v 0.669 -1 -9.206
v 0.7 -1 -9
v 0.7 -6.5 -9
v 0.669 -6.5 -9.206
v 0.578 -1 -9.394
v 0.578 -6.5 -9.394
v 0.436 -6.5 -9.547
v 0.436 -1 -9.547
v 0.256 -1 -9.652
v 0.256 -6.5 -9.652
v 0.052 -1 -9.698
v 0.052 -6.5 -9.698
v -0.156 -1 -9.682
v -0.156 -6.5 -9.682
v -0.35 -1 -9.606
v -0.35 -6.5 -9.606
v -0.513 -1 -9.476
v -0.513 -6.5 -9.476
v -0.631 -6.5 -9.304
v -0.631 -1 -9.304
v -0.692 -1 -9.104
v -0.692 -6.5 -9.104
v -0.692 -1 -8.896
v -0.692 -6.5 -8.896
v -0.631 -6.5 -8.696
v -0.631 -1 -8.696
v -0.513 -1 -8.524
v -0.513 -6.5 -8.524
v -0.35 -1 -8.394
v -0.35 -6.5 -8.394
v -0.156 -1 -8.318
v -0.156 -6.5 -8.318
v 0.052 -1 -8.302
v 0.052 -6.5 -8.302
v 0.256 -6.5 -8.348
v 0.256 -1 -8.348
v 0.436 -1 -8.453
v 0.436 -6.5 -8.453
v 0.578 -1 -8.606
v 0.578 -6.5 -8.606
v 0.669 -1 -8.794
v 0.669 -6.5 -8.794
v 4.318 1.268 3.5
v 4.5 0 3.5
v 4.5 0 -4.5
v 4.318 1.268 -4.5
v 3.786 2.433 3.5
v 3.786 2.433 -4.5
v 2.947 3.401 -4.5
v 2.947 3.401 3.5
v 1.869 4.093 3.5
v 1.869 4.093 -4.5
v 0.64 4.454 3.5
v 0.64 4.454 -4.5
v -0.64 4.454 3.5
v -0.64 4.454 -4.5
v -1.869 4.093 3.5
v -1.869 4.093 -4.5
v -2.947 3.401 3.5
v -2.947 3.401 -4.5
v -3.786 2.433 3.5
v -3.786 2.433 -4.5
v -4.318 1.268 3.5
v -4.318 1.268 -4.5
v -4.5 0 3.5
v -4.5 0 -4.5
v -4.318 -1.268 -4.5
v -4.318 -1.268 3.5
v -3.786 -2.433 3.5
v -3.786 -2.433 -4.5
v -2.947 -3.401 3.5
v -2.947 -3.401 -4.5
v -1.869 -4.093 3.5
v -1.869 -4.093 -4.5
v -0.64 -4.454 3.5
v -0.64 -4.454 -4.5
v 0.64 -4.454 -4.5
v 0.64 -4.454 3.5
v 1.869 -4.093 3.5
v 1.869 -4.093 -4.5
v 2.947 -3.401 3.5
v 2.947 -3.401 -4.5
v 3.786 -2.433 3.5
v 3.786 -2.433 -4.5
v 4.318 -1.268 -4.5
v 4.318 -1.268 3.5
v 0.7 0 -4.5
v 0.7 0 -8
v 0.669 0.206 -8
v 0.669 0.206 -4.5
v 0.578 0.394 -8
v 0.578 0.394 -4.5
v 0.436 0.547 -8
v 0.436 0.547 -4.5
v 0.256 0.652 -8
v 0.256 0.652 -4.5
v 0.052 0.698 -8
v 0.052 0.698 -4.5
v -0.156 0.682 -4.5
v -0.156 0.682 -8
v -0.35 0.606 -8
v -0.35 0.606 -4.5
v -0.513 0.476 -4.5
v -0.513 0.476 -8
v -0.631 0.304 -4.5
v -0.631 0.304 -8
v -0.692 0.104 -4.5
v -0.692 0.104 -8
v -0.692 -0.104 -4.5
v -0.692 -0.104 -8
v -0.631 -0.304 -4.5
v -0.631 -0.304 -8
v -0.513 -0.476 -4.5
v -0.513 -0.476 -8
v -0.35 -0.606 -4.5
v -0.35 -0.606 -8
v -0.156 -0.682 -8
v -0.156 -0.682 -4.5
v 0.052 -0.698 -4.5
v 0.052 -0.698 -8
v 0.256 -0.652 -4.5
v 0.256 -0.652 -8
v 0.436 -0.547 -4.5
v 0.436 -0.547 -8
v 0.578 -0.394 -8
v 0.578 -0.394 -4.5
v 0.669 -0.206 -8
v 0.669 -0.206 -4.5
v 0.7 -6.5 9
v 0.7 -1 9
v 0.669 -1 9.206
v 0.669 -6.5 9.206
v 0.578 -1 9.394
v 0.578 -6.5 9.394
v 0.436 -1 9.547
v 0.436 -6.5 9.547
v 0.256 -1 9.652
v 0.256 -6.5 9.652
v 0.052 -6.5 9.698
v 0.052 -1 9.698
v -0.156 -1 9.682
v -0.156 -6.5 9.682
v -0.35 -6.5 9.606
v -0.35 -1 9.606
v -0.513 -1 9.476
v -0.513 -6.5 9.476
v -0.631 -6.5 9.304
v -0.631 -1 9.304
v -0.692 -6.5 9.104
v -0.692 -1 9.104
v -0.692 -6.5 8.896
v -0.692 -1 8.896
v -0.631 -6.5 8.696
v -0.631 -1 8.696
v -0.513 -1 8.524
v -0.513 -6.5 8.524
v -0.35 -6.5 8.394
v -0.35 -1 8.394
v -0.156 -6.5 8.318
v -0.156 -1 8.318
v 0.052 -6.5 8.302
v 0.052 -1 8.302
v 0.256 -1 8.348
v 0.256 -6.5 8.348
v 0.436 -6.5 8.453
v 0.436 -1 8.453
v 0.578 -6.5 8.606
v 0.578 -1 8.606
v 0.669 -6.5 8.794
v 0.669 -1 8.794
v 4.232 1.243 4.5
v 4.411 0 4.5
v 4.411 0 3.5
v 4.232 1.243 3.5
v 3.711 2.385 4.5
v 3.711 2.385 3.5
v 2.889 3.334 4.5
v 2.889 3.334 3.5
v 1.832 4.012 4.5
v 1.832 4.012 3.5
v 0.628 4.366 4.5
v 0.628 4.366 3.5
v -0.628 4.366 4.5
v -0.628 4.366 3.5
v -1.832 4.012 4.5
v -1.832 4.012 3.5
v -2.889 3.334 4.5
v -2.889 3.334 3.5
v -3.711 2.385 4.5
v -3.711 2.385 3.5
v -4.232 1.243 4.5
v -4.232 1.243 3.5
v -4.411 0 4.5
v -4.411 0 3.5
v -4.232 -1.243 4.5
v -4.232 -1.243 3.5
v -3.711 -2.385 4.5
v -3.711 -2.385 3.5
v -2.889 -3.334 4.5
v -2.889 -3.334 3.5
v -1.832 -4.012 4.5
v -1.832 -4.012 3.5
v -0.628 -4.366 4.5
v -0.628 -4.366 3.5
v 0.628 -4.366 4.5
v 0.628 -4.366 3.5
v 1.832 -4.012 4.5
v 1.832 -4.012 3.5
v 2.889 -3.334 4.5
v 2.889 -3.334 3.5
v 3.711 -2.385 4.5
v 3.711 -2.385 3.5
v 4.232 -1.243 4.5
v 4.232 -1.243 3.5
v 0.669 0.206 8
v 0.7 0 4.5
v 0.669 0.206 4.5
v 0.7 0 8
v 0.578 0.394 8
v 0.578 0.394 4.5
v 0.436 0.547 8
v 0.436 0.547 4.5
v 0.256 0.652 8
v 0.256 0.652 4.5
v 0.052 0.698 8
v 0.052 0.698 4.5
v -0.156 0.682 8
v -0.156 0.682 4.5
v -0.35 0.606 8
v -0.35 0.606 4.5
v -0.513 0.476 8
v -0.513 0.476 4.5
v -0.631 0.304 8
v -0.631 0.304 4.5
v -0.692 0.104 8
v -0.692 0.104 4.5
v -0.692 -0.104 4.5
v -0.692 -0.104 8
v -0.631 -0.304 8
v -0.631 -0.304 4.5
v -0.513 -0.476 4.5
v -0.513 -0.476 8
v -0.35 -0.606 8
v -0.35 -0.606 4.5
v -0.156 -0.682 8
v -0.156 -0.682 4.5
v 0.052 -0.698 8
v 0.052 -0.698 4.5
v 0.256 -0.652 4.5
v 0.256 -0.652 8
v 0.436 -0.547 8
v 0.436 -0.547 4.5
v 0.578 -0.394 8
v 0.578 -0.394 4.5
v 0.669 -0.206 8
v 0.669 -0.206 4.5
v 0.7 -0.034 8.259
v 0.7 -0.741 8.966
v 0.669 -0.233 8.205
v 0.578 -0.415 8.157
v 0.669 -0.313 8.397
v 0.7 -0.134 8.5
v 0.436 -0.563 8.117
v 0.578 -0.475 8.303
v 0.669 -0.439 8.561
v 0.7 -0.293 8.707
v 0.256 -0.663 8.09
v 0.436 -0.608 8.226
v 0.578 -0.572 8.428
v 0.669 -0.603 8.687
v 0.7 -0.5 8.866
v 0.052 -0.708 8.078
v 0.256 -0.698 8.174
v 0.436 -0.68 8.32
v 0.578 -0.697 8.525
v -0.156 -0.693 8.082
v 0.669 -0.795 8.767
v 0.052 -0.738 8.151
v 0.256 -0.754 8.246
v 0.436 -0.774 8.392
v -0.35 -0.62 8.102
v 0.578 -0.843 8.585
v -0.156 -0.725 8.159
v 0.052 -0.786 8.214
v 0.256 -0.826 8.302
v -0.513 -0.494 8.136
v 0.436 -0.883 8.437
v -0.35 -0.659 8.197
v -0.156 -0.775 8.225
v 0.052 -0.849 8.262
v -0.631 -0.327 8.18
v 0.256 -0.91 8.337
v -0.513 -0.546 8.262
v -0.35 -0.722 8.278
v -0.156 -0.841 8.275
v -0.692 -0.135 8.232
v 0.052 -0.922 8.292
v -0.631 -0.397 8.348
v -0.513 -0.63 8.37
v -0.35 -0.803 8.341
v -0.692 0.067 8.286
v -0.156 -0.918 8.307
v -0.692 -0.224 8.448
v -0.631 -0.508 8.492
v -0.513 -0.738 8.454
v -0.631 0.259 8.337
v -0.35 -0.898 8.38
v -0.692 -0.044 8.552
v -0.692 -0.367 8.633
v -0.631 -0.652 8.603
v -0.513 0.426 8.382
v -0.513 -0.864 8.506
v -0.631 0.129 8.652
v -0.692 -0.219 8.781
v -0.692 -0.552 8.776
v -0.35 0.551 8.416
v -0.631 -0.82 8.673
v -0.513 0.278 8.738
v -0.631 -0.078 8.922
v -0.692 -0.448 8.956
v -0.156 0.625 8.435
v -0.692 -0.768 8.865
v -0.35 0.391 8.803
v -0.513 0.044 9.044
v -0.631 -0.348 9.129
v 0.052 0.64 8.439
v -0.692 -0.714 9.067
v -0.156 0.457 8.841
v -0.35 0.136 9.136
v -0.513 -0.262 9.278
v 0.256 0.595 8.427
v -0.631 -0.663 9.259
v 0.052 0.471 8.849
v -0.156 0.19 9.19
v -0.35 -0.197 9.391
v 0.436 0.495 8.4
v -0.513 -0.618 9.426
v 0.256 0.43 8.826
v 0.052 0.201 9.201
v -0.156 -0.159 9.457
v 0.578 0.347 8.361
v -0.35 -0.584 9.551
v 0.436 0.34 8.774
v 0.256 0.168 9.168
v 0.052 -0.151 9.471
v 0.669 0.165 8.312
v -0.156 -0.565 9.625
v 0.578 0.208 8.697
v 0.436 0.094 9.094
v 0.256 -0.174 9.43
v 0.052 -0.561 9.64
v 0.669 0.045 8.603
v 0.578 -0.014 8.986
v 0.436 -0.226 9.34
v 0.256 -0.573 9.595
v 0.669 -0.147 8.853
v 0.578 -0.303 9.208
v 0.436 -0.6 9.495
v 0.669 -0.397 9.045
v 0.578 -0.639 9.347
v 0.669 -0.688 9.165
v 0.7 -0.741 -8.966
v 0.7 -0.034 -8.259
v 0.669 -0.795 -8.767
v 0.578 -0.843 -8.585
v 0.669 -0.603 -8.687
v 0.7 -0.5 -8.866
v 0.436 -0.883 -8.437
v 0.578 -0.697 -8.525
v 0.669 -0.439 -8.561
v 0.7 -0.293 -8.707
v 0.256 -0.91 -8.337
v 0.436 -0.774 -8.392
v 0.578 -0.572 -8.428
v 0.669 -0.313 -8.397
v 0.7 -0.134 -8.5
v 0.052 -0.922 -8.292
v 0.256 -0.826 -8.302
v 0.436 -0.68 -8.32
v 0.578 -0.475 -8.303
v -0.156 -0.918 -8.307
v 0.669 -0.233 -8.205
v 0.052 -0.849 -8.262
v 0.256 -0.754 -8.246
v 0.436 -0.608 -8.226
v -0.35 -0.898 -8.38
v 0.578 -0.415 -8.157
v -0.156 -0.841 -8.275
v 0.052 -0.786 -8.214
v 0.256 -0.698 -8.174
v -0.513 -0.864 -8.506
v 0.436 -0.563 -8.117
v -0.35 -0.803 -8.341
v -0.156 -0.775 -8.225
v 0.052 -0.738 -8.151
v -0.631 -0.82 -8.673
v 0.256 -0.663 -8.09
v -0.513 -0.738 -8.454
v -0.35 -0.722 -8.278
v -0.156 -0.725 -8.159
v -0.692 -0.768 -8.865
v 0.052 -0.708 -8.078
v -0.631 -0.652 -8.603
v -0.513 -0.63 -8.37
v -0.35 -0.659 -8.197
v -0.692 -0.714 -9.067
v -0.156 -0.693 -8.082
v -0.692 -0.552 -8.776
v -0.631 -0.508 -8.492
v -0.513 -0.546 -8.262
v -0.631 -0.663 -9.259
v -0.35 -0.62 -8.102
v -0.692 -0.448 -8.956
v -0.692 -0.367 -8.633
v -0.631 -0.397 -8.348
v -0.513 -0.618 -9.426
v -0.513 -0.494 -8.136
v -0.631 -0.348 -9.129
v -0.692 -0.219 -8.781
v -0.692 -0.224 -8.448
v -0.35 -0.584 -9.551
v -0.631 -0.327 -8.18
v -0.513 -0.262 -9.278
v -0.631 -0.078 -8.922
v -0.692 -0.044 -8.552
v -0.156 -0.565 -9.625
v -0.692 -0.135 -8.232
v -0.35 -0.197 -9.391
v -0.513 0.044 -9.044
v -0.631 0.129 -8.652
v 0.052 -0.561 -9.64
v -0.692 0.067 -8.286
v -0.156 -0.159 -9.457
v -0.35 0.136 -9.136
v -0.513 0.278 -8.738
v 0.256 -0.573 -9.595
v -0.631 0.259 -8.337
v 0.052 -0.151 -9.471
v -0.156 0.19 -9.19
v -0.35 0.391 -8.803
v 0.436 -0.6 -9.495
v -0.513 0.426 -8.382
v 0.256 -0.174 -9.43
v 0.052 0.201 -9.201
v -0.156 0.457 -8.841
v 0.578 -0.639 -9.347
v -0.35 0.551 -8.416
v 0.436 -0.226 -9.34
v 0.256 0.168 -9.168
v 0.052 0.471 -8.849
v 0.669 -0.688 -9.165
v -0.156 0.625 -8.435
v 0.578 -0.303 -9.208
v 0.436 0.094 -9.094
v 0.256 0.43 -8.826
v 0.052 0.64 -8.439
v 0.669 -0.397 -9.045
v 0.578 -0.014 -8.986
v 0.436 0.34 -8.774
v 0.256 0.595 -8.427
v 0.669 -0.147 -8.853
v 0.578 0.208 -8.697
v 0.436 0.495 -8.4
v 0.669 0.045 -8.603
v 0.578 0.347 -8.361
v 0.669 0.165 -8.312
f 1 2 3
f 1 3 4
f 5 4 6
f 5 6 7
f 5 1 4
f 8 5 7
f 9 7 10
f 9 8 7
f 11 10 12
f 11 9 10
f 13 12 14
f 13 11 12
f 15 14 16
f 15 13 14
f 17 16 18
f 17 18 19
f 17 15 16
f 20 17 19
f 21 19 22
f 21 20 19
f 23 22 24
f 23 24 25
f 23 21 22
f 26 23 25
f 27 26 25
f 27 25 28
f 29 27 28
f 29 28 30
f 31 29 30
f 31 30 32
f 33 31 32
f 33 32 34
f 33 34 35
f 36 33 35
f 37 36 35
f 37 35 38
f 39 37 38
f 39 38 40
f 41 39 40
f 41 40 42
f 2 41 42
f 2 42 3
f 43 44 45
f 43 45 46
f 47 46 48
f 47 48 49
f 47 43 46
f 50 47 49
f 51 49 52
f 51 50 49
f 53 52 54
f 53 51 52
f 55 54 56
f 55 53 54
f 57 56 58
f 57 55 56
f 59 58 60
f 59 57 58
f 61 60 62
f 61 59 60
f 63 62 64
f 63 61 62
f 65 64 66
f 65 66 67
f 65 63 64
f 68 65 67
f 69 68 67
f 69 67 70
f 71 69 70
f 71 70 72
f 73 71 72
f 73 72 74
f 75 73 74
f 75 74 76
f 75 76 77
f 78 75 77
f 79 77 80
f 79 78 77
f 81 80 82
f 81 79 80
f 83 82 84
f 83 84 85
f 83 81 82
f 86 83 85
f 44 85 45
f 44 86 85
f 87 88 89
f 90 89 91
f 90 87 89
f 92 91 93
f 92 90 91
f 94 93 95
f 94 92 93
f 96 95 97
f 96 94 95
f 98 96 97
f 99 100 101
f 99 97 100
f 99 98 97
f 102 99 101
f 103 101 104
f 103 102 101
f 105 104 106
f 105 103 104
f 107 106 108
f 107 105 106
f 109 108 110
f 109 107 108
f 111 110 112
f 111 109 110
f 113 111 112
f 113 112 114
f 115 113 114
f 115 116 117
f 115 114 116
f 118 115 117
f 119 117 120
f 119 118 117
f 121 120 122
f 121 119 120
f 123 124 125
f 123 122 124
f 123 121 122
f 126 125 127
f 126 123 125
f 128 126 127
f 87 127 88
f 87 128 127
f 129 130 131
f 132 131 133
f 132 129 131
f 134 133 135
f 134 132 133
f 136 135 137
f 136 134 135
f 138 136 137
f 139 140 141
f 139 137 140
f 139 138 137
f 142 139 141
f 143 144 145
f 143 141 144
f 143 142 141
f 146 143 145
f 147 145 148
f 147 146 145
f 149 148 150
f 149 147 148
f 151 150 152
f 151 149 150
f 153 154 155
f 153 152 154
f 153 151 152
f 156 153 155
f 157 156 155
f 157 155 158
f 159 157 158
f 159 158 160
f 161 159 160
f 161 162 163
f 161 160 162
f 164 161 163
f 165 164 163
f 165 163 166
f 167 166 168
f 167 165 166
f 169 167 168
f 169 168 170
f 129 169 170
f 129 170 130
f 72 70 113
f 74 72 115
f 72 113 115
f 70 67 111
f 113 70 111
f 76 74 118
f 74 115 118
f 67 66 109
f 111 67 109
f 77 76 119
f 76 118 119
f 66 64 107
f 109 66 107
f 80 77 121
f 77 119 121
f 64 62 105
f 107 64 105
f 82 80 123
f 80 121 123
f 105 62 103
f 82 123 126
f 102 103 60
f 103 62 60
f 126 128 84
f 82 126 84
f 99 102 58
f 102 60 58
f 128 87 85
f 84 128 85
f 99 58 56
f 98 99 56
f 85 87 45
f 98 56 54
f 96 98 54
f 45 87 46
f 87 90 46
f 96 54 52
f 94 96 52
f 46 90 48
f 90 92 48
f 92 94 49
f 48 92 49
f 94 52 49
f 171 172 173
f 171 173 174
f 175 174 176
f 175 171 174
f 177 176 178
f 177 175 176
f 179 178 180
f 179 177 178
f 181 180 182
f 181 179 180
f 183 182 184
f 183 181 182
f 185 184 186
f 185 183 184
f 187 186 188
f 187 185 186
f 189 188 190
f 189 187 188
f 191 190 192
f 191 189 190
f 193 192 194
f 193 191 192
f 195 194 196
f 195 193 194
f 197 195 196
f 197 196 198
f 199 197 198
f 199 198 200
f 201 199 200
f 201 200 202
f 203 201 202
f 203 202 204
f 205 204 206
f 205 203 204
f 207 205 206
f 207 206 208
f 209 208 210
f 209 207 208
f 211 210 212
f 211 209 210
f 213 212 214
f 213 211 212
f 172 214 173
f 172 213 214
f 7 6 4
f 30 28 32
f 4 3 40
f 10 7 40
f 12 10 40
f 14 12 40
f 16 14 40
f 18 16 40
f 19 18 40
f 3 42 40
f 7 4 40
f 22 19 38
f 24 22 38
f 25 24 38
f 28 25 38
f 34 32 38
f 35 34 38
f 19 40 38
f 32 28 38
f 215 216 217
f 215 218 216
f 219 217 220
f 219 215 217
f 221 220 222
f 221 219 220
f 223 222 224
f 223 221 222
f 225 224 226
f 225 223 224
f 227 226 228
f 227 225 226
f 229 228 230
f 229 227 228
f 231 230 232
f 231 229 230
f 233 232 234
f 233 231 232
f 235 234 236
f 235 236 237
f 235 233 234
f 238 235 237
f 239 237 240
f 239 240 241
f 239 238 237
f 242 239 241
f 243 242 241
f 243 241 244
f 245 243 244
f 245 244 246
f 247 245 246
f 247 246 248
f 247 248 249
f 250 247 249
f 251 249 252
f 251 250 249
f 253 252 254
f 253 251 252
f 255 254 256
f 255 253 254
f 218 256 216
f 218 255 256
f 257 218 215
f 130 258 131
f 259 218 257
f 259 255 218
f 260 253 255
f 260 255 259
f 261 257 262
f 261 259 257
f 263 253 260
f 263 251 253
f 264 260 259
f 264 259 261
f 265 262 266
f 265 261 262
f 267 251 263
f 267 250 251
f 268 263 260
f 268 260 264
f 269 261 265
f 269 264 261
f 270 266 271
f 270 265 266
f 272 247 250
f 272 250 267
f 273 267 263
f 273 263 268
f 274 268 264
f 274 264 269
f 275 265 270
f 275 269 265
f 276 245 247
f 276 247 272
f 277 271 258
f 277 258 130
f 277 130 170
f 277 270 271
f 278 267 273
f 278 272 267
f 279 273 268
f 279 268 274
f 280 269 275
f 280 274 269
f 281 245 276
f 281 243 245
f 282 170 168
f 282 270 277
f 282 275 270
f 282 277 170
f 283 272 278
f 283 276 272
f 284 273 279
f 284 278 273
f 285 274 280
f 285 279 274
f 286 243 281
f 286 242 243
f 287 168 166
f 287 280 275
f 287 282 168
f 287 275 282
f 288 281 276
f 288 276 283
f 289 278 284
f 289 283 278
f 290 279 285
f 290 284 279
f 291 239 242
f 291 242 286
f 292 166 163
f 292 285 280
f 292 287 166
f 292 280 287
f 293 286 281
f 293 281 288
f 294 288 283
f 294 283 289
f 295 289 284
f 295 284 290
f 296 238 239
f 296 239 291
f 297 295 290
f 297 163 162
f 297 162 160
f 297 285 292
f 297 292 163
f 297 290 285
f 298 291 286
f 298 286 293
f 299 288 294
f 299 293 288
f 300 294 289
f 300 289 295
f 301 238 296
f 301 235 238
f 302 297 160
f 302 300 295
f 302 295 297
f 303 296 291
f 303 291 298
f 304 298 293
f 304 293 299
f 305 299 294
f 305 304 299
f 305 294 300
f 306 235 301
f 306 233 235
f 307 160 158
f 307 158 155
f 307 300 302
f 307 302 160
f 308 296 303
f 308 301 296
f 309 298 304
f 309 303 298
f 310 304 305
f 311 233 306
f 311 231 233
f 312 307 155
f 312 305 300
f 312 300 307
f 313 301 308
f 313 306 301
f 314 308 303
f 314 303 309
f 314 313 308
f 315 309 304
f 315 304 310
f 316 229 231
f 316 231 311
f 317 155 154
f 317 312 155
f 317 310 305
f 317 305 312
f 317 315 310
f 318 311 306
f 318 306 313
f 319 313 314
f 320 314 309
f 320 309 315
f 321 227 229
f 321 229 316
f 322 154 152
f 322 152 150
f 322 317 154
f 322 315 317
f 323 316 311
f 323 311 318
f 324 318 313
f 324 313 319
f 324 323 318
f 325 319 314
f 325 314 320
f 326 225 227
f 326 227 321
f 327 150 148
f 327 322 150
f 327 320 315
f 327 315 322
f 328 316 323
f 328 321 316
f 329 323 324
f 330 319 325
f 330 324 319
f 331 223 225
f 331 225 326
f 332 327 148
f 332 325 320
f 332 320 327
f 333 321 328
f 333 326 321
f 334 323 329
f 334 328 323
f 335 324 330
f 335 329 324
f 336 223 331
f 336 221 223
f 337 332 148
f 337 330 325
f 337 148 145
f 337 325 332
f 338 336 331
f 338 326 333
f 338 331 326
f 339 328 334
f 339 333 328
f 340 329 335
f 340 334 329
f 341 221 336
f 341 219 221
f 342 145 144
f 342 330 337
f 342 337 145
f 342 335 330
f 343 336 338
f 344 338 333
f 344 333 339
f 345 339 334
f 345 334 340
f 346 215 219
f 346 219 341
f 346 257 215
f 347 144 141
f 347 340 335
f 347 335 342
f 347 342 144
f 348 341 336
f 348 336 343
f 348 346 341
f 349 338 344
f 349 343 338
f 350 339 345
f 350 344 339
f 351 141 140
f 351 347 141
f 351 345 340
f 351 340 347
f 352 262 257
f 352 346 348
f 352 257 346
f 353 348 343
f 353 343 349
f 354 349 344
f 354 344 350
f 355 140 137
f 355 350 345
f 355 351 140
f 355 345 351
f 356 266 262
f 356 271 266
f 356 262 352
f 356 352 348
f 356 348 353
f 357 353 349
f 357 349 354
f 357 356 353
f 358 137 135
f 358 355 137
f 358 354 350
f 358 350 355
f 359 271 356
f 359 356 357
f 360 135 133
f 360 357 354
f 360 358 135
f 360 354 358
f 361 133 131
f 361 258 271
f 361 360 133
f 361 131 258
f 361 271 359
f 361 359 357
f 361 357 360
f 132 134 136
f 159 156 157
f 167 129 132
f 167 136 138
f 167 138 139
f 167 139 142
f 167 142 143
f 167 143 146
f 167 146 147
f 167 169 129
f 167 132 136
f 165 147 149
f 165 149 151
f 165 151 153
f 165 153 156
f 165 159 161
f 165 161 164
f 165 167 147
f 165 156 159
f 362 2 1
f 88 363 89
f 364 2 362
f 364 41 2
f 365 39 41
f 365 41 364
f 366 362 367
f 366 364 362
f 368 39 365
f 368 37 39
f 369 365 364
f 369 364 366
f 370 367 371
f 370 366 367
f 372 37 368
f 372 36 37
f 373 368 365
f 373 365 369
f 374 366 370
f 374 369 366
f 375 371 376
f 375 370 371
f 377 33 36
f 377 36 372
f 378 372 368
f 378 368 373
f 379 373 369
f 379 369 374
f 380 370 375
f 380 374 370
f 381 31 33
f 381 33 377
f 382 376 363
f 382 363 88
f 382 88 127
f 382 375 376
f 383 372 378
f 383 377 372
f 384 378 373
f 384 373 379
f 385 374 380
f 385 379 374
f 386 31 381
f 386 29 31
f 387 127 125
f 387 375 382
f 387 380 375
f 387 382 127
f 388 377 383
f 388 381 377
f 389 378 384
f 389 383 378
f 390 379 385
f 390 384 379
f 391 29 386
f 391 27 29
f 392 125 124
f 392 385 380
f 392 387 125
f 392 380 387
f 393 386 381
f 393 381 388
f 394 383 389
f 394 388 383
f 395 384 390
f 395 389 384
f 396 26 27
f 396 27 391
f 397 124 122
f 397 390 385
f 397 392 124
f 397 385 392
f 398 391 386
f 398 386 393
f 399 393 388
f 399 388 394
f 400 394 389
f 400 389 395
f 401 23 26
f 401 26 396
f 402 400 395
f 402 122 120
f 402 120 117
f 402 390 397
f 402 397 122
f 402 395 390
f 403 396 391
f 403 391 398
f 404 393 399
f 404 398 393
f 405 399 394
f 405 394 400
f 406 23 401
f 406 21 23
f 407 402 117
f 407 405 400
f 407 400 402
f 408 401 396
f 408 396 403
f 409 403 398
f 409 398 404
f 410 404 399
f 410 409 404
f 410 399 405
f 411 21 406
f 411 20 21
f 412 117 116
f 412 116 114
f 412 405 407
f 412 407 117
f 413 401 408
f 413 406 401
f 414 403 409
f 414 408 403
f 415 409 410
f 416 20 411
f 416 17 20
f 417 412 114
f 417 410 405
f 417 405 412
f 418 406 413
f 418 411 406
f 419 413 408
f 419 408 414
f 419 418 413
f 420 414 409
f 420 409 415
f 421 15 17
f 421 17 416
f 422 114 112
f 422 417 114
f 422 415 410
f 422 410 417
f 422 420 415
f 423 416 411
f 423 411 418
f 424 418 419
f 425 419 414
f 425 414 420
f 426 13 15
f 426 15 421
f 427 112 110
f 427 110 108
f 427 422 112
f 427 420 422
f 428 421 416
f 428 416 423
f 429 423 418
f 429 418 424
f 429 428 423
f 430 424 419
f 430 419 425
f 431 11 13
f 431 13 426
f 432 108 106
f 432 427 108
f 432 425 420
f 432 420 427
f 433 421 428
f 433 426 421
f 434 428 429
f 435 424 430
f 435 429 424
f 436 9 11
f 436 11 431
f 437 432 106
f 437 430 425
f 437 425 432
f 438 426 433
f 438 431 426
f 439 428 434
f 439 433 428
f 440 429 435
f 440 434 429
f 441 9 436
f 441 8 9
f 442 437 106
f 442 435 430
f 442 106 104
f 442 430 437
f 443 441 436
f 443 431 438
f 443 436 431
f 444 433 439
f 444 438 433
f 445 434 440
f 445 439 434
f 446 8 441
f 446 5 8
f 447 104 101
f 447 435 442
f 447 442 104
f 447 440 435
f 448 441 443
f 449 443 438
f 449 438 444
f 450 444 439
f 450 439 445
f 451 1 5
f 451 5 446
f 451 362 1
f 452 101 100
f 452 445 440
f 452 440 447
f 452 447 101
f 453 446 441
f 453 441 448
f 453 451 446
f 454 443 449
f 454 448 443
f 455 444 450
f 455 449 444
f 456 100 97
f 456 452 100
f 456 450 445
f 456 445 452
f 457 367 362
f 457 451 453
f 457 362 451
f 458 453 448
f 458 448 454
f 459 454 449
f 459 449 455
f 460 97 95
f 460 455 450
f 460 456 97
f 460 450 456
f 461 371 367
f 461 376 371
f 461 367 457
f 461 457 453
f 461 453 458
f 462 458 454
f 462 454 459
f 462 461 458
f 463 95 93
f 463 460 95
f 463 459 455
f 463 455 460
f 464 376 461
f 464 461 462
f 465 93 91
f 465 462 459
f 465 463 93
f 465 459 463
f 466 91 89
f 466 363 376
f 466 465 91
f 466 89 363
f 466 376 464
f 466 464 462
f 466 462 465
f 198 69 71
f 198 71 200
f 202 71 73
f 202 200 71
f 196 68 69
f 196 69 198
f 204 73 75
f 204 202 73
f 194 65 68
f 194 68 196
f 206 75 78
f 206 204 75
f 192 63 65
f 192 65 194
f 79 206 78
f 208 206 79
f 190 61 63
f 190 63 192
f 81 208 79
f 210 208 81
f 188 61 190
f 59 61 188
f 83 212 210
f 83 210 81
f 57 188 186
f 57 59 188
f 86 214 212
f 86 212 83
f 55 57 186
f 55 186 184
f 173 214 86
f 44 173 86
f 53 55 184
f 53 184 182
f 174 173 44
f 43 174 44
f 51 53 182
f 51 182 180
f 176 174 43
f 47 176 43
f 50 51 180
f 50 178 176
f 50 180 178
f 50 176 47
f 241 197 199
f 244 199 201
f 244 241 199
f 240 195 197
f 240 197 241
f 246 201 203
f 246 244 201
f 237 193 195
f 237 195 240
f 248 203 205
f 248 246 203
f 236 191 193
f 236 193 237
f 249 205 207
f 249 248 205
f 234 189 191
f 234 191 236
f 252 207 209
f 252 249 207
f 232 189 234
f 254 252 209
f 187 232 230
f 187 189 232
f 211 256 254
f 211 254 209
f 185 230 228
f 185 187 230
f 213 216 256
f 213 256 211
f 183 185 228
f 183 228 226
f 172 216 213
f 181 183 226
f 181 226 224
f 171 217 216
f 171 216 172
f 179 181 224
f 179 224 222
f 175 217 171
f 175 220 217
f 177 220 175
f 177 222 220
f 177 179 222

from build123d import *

# Parameters (mm, degrees)
SKETCH_1_R          = 4.5
EXTRUDE_1_DEPTH     = 4.5
SKETCH_2_R          = 5.333427414
SKETCH_2_R_2        = 4.410947686
CUT_EXTRUDE_1_DEPTH = 1
SKETCH_4_R          = 0.7


with BuildPart() as part:
    # Эскиз1 → Бобышка-Вытянуть1 (new, symmetric)
    with BuildSketch(Plane.XY):
        Circle(SKETCH_1_R)
    extrude(amount=EXTRUDE_1_DEPTH, both=True)

    # Эскиз2 → Вырез-Вытянуть1 (cut)
    with BuildSketch(Plane.XY.offset(4.5)):
        Circle(SKETCH_2_R)
        Circle(SKETCH_2_R_2, mode=Mode.SUBTRACT)
    extrude(amount=-CUT_EXTRUDE_1_DEPTH, mode=Mode.SUBTRACT)

    # По траектории1: sweep along a path in Эскиз3
    with BuildLine(Plane(origin=(0, 0, 0), x_dir=(0, 0, -1), z_dir=(1, 0, 0))) as sweep_1_path:
        Line((9, -6.5), (9, -1))
        ThreePointArc((9, -1), (8.707106781, -0.292893219), (8, 0))
        Line((8, 0), (-8, 0))
        ThreePointArc((-8, 0), (-8.707106781, -0.292893219), (-9, -1))
        Line((-9, -1), (-9, -6.5))
    # Эскиз4 → По траектории1 (sweep)
    with BuildSketch(Plane.XY):
        Circle(SKETCH_4_R)
    sweep(path=sweep_1_path.line)


solid = part.part
